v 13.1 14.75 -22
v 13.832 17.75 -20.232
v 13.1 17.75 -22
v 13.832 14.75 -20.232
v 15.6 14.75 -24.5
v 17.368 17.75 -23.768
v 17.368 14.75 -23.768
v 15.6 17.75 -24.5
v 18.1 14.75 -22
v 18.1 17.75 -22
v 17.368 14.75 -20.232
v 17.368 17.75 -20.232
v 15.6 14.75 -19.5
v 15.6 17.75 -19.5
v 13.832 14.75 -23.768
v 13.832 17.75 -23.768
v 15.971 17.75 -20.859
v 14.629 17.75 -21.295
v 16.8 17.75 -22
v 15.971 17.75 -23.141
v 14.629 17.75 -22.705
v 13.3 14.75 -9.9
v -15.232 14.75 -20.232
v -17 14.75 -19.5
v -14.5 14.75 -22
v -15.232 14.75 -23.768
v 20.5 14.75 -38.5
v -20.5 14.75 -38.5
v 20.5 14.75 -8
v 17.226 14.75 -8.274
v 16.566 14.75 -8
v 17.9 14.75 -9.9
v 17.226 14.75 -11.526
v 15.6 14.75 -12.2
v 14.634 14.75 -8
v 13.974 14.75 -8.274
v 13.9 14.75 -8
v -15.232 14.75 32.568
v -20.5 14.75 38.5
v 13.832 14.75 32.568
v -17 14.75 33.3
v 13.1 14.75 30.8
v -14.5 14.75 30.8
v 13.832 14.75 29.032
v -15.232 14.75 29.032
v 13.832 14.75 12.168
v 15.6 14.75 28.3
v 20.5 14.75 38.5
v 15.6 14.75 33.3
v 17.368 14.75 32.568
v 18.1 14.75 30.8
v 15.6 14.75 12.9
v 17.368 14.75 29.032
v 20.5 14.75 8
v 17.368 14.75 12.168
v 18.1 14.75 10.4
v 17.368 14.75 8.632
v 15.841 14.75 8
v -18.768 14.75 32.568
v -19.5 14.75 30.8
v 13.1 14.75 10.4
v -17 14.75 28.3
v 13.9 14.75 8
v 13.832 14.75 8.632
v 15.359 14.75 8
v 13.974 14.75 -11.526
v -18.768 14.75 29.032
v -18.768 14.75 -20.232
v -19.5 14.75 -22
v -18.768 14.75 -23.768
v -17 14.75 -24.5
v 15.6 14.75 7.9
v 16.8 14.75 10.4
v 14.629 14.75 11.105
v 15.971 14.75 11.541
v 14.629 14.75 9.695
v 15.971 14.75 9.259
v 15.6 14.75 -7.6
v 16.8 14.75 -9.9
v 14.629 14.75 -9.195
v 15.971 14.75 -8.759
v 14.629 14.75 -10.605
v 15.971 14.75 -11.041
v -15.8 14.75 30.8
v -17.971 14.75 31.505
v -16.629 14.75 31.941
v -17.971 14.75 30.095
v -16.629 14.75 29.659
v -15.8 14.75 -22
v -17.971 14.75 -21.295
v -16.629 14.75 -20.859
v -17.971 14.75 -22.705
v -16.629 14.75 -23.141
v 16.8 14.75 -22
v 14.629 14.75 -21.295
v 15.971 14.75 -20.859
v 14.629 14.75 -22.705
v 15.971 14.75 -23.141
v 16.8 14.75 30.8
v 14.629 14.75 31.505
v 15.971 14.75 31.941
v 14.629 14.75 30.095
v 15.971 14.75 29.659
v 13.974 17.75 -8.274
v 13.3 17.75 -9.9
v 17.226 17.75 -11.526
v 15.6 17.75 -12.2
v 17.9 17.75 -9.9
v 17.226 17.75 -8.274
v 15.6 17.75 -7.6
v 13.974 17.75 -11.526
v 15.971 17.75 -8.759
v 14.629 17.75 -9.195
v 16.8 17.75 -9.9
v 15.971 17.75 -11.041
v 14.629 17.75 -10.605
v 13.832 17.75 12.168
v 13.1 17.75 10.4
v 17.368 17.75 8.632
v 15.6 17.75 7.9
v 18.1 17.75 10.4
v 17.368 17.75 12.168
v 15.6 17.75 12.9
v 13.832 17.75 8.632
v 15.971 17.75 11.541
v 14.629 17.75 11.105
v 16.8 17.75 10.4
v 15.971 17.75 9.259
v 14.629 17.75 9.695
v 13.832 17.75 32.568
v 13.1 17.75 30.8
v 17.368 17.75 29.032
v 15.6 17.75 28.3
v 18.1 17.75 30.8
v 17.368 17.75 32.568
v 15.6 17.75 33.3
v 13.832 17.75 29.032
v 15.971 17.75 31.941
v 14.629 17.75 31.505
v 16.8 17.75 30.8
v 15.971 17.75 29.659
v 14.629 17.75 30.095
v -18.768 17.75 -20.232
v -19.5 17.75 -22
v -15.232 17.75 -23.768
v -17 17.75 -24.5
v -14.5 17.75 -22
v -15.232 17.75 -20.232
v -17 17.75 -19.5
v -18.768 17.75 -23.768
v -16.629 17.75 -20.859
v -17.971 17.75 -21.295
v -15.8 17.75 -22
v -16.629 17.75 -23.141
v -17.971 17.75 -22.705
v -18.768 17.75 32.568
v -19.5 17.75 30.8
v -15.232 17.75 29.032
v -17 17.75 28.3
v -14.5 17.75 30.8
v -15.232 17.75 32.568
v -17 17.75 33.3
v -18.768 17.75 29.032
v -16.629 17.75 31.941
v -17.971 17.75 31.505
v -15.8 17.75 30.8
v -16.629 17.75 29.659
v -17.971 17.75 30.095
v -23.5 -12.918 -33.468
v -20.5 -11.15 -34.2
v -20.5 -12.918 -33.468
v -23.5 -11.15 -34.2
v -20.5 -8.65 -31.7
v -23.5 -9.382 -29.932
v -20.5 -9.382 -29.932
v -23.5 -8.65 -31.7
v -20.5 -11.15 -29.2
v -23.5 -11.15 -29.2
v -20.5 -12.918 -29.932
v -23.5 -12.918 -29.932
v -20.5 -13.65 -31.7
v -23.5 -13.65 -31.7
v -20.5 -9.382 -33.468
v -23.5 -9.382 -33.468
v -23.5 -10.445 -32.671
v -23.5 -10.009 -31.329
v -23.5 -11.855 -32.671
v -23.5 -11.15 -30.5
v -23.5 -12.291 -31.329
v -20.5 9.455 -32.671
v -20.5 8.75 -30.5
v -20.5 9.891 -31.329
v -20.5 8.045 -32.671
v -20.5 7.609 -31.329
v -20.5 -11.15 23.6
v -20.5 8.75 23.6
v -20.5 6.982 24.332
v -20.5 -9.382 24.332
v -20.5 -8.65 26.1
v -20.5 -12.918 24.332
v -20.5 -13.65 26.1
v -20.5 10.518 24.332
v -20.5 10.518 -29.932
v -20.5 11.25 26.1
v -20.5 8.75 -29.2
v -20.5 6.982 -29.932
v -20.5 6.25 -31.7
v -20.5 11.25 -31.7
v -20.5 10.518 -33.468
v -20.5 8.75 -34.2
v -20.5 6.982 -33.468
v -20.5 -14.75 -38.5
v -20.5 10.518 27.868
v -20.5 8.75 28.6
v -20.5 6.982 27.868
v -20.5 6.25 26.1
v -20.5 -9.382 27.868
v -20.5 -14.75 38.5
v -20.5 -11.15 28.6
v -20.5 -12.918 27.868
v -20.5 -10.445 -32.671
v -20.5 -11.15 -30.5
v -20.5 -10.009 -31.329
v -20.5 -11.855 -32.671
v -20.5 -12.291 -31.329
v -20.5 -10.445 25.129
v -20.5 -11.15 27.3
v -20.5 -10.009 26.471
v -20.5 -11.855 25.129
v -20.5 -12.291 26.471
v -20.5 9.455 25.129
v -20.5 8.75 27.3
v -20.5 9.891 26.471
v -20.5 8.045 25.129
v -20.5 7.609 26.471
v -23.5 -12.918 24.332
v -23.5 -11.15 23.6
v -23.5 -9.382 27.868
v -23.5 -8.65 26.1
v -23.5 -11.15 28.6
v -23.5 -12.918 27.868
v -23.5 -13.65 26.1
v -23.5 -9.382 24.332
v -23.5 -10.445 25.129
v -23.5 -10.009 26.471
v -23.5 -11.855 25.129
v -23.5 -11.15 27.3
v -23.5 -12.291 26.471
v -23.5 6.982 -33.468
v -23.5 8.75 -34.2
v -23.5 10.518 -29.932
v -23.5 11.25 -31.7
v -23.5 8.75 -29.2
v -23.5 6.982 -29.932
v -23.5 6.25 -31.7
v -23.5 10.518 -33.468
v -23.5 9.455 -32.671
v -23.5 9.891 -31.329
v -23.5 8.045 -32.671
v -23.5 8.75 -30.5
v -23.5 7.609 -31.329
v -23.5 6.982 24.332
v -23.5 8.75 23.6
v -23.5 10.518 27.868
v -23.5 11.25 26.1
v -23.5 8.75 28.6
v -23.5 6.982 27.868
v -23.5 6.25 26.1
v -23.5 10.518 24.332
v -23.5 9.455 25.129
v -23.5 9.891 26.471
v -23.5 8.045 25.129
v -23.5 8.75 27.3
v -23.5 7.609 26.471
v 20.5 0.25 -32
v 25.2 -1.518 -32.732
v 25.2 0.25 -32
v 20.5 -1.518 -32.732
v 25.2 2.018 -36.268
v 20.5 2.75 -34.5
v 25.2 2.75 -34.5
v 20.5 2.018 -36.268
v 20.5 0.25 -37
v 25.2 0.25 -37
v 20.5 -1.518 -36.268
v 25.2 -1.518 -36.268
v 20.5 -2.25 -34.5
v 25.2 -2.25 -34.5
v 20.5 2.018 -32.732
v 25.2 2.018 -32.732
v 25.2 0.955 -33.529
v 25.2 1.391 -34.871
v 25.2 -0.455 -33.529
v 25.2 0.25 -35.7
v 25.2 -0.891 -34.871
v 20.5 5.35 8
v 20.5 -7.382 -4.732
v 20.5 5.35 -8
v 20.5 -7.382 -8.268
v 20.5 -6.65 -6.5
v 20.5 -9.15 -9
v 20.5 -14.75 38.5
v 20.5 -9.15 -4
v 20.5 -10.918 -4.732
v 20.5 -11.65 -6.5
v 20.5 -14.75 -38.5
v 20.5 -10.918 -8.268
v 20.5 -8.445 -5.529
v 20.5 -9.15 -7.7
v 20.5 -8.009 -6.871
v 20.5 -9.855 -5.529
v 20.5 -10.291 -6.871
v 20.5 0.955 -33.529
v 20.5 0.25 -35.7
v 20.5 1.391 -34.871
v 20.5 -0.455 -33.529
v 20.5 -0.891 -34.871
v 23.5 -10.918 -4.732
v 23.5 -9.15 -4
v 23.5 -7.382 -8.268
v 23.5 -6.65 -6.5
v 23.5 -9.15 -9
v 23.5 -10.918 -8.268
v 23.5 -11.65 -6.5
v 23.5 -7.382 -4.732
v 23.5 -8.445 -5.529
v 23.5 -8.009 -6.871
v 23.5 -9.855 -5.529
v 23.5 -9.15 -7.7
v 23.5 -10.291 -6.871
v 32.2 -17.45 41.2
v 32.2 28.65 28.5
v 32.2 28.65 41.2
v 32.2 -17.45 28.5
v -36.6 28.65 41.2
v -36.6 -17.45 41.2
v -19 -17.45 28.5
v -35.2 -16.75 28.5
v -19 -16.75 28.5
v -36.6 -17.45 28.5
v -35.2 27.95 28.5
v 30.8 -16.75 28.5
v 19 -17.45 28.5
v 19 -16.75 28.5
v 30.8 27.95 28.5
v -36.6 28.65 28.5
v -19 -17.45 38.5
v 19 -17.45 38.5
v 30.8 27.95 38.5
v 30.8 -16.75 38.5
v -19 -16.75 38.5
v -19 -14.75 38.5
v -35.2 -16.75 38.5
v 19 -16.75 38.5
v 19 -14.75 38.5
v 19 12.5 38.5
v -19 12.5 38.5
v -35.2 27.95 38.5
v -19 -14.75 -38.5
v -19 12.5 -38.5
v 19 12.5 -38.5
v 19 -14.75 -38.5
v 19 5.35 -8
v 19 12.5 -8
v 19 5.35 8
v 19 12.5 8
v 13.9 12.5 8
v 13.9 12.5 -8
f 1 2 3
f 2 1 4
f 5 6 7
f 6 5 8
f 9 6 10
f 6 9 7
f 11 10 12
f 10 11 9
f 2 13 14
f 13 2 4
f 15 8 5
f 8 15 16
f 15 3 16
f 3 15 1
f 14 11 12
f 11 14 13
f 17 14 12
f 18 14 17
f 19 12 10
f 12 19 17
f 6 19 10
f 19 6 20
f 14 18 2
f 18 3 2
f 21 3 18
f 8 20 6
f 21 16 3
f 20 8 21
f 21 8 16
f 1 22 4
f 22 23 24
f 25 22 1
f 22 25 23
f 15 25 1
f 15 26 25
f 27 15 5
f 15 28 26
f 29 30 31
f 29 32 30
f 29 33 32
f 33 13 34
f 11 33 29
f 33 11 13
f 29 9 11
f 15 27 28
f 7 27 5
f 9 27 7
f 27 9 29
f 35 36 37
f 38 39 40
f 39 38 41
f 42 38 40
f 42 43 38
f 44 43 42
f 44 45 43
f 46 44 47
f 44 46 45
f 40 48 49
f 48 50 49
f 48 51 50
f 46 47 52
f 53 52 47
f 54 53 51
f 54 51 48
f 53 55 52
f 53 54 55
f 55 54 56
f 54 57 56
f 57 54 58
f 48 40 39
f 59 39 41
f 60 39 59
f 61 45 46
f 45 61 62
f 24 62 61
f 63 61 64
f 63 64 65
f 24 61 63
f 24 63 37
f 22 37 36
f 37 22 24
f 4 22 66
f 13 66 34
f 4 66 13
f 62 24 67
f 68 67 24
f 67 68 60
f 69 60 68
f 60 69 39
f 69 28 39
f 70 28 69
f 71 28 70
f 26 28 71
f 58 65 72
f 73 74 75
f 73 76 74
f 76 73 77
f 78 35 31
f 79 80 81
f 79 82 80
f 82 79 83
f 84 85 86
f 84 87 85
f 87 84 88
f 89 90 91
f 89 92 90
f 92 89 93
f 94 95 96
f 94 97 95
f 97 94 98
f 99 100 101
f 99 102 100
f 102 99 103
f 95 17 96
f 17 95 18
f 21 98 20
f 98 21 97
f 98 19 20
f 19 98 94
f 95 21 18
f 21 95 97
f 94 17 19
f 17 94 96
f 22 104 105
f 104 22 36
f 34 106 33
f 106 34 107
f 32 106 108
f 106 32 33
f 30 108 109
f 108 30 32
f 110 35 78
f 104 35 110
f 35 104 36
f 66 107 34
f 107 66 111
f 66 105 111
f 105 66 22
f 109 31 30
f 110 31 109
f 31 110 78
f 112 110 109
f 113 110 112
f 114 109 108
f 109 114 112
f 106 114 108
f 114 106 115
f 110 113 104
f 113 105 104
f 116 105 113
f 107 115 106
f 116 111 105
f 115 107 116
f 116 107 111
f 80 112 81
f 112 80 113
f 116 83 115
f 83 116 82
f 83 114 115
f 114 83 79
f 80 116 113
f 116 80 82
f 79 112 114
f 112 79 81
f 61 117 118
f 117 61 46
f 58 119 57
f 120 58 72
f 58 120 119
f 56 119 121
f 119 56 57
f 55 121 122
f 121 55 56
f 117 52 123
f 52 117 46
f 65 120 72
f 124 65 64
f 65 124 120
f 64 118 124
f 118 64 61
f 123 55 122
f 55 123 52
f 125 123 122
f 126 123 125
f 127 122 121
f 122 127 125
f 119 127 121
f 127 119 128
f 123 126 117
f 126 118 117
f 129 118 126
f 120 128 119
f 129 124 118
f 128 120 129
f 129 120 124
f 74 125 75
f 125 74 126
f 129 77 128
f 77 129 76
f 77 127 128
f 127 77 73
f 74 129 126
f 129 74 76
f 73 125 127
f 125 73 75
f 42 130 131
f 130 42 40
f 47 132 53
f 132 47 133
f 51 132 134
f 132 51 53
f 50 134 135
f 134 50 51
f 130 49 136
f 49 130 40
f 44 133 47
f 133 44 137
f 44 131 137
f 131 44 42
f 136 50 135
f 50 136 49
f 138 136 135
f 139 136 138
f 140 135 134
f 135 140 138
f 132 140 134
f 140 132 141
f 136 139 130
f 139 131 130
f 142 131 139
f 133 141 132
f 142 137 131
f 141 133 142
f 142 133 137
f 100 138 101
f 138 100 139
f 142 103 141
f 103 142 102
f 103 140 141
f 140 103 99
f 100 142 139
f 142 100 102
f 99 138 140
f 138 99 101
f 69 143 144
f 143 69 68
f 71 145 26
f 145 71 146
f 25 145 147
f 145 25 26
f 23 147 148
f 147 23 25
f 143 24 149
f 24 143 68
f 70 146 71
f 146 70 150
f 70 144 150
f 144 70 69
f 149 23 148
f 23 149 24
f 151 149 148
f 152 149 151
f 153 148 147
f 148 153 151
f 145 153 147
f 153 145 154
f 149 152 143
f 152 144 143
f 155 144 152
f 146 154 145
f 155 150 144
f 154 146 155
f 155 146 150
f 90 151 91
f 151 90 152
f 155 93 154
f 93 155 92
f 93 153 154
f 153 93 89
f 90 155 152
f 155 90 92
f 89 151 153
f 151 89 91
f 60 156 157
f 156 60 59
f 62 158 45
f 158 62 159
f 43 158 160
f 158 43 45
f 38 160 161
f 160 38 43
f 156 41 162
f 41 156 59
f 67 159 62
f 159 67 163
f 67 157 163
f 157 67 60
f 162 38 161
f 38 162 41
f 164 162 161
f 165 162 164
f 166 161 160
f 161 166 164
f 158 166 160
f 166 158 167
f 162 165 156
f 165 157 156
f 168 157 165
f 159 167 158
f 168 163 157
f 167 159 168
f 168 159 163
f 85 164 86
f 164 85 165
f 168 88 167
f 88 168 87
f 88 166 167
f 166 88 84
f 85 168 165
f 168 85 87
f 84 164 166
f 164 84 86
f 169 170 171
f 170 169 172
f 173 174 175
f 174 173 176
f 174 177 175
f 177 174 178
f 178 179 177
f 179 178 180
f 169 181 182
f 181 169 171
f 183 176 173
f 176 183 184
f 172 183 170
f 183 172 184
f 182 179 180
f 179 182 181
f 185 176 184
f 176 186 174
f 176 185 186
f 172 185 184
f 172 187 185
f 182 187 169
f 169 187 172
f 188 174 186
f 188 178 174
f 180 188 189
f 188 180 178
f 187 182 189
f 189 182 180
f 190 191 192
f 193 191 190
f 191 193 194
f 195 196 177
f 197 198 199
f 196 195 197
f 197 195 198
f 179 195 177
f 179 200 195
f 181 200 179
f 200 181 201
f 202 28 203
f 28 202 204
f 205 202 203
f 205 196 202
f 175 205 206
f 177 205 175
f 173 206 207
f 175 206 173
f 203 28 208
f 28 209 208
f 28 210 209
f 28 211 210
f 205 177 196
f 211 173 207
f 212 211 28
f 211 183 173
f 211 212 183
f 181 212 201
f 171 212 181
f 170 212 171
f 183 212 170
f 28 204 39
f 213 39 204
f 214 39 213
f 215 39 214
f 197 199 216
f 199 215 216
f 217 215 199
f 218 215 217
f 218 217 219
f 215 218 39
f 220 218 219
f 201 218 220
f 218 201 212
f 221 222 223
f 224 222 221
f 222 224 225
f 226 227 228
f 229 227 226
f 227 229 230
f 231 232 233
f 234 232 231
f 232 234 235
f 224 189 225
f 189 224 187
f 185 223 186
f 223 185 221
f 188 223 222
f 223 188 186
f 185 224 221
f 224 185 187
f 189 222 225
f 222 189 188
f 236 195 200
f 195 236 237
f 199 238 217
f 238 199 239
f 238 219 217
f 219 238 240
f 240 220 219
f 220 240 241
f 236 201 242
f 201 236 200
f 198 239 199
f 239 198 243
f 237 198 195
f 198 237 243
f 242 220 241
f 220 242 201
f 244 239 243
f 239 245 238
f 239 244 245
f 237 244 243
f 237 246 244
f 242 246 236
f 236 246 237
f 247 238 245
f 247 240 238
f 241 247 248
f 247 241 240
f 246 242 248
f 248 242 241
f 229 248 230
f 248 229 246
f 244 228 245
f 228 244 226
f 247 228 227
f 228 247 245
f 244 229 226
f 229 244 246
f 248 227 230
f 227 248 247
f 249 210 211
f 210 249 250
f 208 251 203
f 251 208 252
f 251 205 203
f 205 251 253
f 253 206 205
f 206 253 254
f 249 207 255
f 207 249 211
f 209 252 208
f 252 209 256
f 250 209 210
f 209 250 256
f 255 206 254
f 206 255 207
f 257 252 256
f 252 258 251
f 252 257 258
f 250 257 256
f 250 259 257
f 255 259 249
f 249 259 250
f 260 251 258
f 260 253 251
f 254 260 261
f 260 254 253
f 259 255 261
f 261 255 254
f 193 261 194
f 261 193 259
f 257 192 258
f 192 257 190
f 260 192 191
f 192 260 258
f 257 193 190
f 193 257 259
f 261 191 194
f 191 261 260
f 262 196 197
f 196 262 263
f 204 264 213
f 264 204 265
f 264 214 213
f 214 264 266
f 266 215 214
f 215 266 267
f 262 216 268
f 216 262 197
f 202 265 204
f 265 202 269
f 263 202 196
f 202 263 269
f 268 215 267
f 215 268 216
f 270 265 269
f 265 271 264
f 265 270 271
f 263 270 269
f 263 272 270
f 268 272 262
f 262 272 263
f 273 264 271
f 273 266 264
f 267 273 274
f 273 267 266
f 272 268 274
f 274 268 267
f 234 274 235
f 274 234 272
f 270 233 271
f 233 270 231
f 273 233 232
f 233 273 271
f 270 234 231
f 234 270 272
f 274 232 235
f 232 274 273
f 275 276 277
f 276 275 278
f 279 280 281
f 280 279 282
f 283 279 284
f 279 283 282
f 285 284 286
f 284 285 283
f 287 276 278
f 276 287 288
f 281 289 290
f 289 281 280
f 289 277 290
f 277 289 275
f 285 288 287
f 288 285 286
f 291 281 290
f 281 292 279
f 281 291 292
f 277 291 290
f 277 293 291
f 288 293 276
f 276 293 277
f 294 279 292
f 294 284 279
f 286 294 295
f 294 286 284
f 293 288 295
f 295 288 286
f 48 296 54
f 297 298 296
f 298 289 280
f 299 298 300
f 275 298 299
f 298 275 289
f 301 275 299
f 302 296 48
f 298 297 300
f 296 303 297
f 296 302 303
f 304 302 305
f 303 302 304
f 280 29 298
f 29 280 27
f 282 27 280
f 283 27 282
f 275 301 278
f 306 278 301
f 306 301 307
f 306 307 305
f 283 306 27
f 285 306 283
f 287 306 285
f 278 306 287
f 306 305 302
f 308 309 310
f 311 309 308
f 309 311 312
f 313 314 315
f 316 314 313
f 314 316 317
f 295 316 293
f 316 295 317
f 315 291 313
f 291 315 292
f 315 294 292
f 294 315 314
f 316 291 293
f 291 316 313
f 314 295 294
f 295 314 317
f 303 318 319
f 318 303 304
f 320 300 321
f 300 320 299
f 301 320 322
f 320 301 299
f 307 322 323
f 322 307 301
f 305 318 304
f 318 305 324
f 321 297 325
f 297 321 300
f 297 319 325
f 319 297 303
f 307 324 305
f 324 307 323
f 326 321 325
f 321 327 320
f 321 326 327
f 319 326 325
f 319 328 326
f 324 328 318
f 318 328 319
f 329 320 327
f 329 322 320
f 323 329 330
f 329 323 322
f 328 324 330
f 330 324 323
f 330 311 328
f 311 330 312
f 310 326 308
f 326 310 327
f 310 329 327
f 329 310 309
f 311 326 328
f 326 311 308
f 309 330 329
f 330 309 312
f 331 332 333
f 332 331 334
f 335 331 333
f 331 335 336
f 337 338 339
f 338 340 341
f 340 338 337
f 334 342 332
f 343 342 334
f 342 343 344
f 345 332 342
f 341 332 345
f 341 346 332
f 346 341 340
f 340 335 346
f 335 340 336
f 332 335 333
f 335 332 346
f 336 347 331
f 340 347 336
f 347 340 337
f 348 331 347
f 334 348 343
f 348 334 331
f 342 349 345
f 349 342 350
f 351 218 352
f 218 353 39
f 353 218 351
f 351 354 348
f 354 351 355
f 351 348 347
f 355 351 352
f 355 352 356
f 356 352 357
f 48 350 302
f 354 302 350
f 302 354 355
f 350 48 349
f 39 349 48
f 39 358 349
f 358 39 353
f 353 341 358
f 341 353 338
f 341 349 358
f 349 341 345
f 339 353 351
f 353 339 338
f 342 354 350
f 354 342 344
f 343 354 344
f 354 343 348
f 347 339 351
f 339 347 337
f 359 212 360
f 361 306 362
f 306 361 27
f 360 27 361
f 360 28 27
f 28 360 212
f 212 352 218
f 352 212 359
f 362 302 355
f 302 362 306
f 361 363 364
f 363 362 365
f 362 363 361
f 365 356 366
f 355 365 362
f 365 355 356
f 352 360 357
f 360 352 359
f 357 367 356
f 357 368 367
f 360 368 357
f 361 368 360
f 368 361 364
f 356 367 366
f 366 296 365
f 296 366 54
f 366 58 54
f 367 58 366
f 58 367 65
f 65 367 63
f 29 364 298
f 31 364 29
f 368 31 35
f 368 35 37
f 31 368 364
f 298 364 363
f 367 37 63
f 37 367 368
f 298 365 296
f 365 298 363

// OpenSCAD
//頭4.8(2.4)(2.9)mmネジ3.4(1.7)mmナット5.8(2.9)(3.4)mm
//頭4.8(2.4)(2.9)mmネジ3.4(1.7)mmナット5.8(2.9)(3.4)mm
difference() {
    union(){

    // 外枠（厚み6.5mm）
    translate([0,0,0])
    cube([41, 29.5,77 ], center = true);//外装
//ESP32--------------------------
    translate([41/2-4.9, 29.5/2, -77/2 + 16.5])
    rotate([-90,0,0])//ネジ穴＋出っ張り
    difference(){
        cylinder(h = 3, r = 2.5, center = false);
        cylinder(h = 3, r = 1.2, center = false);
    }
    translate([41/2-4.9, 29.5/2, -77/2 + 16.5 +12.1])
    rotate([-90,0,0])//ネジ穴＋出っ張り
    difference(){
        cylinder(h = 3, r = 2.3, center = false);
        cylinder(h = 3, r = 1.2, center = false);

    }
        translate([41/2-4.9, 29.5/2, -77/2 + 16.5 + 32.4])
    rotate([-90,0,0])//ネジ穴＋出っ張り
    difference(){
        cylinder(h = 3, r = 2.5, center = false);
        cylinder(h = 3, r = 1.2, center = false);
    }
    translate([41/2-4.9, 29.5/2, -77/2 + 16.5 + 52.8])
    rotate([-90,0,0])//ネジ穴＋出っ張り
    difference(){
        cylinder(h = 3, r = 2.5, center = false);
        cylinder(h = 3, r = 1.2, center = false);

    }
            translate([ 41/2-(4.9 + 32.6), 29.5/2, -77/2 + 16.5])
    rotate([-90,0,0])//ネジ穴＋出っ張り
    difference(){
        cylinder(h = 3, r = 2.5, center = false);
        cylinder(h = 3, r = 1.2, center = false);
    }
    translate([ 41/2-(4.9 + 32.6), 29.5/2, -77/2 + 16.5 + 52.8])
    rotate([-90,0,0])//ネジ穴＋出っ張り
    difference(){
        cylinder(h = 3, r = 2.5, center = false);
        cylinder(h = 3, r = 1.2, center = false);

    }
//ESP32--------------------------
//LSI--------------------------
    translate([ -41/2, -29.5/2 + 3.6, -77/2 + 6.8])
    rotate([0,-90,0])//ネジ穴＋出っ張り
    difference(){
        cylinder(h = 3, r = 2.5, center = false);
        cylinder(h = 3, r = 1.2, center = false);

    }

        translate([ -41/2,-29.5/2 + 3.6, -77/2 + 6.8 + 57.8])
    rotate([0,-90,0])//ネジ穴＋出っ張り
    difference(){
        cylinder(h = 3, r = 2.5, center = false);
        cylinder(h = 3, r = 1.2, center = false);

    }

        translate([ -41/2, -29.5/2 + 3.6 + 19.9, -77/2 + 6.8])
    rotate([0,-90,0])//ネジ穴＋出っ張り
    difference(){
        cylinder(h = 3, r = 2.5, center = false);
        cylinder(h = 3, r = 1.2, center = false);

    }

        translate([ -41/2, -29.5/2 + 3.6 + 19.9, -77/2 + 6.8 + 57.8])
    rotate([0,-90,0])//ネジ穴＋出っ張り
    difference(){
        cylinder(h = 3, r = 2.5, center = false);
        cylinder(h = 3, r = 1.2, center = false);

    }
    //LSI--------------------------
    //GPS--------------------------
            translate([41/2, 29.5/2 - 14.5, -77/2 + 4.0])
    rotate([0,90,0])//ネジ穴＋出っ張り
    difference(){
        cylinder(h = 4.7, r = 2.5, center = false);
        cylinder(h = 4.7, r = 1.2, center = false);

    }

        translate([41/2, 29.5/2 - (14.5 + 9.4), -77/2 + 4.0 + 28])
    rotate([0,90,0])//ネジ穴＋出っ張り
    difference(){
        cylinder(h = 3, r = 2.5, center = false);
        cylinder(h = 3, r = 1.2, center = false);

    }

    //GPS--------------------------
    //フタ-------------------------
    difference(){
            translate([41/2 -(41 + 9 + 13.4 + 2.7 * 2)/2 + 9 + 2.7, -29.5/2 + (29.5 + 11.2 + 2.7 *2)/2 - 2.7,77/2 - 12.7/2+2.7])
            cube([41 + 9 + 13.4 + 2.7 * 2, 29.5 + 11.2 + 2.7 *2, 12.7], center = true);

            translate([41/2 -(41 + 9 + 13.4 + 2.7 * 2)/2 + 9 + 2.7, -29.5/2 + (29.5 + 11.2 + 2.7 *2)/2 - 2.7,77/2 - 12.7/2])
            cube([41 + 9 + 13.4 + 2.7 * 2 - 2.8, 29.5 + 11.2 + 2.7 *2 - 1.4, 12.7], center = true);

            translate([0, -10,77/2 - 12.7/2])
                cube([38, 28,12.7], center = true);//くりぬき


    }



    }

    translate([0,-1.5,0])
    cube([38, 28,77 ], center = true);//くりぬき

    translate([41/2-3.3, 29.5/2-9.4/2,0])
    cube([6.6, 9.4, 16], center = true);//端子くりぬき(xz面) 




/*
    //本体部
    translate([0,0,1.5])
    cube([90, 51,8.8], center = true);

    translate([90/2-21.4,-(64/2)+10,0])
    cube([6.5, 3,100], center = true);//端子

    translate([90/2-24.9,-(64/2)+32.5,0])
    cube([10.4, 11,100], center = true);//ロータリースイッチ

    translate([90/2-28.5,64/2,3.1])
    cube([19, 30,5.7], center = true);//アンテナ


    //ネジ
    translate([95/2-3,60/2-1,-20])
    cylinder(h = 100, r = 1.7, center = false);

    translate([-(95/2-3),60/2-1,-20])
    cylinder(h = 100, r = 1.7, center = false);

    translate([95/2-3,-(60/2-1),-20])
    cylinder(h = 100, r = 1.7, center = false);

    translate([-(95/2-3),-(60/2-1),-20])
    cylinder(h = 100, r = 1.7, center = false);

        //ネジ頭
    translate([95/2-3,60/2-1,-(11.8/2)])
    cylinder(h = 2, r = 3, center = false);

    translate([-(95/2-3),60/2-1,-(11.8/2)])
    cylinder(h = 2, r = 3, center = false);

    translate([95/2-3,-(60/2-1),-(11.8/2)])
    cylinder(h = 2, r = 3, center = false);

    translate([-(95/2-3),-(60/2-1),-(11.8/2)])
    cylinder(h = 2, r = 3, center = false);
*/


   
}
